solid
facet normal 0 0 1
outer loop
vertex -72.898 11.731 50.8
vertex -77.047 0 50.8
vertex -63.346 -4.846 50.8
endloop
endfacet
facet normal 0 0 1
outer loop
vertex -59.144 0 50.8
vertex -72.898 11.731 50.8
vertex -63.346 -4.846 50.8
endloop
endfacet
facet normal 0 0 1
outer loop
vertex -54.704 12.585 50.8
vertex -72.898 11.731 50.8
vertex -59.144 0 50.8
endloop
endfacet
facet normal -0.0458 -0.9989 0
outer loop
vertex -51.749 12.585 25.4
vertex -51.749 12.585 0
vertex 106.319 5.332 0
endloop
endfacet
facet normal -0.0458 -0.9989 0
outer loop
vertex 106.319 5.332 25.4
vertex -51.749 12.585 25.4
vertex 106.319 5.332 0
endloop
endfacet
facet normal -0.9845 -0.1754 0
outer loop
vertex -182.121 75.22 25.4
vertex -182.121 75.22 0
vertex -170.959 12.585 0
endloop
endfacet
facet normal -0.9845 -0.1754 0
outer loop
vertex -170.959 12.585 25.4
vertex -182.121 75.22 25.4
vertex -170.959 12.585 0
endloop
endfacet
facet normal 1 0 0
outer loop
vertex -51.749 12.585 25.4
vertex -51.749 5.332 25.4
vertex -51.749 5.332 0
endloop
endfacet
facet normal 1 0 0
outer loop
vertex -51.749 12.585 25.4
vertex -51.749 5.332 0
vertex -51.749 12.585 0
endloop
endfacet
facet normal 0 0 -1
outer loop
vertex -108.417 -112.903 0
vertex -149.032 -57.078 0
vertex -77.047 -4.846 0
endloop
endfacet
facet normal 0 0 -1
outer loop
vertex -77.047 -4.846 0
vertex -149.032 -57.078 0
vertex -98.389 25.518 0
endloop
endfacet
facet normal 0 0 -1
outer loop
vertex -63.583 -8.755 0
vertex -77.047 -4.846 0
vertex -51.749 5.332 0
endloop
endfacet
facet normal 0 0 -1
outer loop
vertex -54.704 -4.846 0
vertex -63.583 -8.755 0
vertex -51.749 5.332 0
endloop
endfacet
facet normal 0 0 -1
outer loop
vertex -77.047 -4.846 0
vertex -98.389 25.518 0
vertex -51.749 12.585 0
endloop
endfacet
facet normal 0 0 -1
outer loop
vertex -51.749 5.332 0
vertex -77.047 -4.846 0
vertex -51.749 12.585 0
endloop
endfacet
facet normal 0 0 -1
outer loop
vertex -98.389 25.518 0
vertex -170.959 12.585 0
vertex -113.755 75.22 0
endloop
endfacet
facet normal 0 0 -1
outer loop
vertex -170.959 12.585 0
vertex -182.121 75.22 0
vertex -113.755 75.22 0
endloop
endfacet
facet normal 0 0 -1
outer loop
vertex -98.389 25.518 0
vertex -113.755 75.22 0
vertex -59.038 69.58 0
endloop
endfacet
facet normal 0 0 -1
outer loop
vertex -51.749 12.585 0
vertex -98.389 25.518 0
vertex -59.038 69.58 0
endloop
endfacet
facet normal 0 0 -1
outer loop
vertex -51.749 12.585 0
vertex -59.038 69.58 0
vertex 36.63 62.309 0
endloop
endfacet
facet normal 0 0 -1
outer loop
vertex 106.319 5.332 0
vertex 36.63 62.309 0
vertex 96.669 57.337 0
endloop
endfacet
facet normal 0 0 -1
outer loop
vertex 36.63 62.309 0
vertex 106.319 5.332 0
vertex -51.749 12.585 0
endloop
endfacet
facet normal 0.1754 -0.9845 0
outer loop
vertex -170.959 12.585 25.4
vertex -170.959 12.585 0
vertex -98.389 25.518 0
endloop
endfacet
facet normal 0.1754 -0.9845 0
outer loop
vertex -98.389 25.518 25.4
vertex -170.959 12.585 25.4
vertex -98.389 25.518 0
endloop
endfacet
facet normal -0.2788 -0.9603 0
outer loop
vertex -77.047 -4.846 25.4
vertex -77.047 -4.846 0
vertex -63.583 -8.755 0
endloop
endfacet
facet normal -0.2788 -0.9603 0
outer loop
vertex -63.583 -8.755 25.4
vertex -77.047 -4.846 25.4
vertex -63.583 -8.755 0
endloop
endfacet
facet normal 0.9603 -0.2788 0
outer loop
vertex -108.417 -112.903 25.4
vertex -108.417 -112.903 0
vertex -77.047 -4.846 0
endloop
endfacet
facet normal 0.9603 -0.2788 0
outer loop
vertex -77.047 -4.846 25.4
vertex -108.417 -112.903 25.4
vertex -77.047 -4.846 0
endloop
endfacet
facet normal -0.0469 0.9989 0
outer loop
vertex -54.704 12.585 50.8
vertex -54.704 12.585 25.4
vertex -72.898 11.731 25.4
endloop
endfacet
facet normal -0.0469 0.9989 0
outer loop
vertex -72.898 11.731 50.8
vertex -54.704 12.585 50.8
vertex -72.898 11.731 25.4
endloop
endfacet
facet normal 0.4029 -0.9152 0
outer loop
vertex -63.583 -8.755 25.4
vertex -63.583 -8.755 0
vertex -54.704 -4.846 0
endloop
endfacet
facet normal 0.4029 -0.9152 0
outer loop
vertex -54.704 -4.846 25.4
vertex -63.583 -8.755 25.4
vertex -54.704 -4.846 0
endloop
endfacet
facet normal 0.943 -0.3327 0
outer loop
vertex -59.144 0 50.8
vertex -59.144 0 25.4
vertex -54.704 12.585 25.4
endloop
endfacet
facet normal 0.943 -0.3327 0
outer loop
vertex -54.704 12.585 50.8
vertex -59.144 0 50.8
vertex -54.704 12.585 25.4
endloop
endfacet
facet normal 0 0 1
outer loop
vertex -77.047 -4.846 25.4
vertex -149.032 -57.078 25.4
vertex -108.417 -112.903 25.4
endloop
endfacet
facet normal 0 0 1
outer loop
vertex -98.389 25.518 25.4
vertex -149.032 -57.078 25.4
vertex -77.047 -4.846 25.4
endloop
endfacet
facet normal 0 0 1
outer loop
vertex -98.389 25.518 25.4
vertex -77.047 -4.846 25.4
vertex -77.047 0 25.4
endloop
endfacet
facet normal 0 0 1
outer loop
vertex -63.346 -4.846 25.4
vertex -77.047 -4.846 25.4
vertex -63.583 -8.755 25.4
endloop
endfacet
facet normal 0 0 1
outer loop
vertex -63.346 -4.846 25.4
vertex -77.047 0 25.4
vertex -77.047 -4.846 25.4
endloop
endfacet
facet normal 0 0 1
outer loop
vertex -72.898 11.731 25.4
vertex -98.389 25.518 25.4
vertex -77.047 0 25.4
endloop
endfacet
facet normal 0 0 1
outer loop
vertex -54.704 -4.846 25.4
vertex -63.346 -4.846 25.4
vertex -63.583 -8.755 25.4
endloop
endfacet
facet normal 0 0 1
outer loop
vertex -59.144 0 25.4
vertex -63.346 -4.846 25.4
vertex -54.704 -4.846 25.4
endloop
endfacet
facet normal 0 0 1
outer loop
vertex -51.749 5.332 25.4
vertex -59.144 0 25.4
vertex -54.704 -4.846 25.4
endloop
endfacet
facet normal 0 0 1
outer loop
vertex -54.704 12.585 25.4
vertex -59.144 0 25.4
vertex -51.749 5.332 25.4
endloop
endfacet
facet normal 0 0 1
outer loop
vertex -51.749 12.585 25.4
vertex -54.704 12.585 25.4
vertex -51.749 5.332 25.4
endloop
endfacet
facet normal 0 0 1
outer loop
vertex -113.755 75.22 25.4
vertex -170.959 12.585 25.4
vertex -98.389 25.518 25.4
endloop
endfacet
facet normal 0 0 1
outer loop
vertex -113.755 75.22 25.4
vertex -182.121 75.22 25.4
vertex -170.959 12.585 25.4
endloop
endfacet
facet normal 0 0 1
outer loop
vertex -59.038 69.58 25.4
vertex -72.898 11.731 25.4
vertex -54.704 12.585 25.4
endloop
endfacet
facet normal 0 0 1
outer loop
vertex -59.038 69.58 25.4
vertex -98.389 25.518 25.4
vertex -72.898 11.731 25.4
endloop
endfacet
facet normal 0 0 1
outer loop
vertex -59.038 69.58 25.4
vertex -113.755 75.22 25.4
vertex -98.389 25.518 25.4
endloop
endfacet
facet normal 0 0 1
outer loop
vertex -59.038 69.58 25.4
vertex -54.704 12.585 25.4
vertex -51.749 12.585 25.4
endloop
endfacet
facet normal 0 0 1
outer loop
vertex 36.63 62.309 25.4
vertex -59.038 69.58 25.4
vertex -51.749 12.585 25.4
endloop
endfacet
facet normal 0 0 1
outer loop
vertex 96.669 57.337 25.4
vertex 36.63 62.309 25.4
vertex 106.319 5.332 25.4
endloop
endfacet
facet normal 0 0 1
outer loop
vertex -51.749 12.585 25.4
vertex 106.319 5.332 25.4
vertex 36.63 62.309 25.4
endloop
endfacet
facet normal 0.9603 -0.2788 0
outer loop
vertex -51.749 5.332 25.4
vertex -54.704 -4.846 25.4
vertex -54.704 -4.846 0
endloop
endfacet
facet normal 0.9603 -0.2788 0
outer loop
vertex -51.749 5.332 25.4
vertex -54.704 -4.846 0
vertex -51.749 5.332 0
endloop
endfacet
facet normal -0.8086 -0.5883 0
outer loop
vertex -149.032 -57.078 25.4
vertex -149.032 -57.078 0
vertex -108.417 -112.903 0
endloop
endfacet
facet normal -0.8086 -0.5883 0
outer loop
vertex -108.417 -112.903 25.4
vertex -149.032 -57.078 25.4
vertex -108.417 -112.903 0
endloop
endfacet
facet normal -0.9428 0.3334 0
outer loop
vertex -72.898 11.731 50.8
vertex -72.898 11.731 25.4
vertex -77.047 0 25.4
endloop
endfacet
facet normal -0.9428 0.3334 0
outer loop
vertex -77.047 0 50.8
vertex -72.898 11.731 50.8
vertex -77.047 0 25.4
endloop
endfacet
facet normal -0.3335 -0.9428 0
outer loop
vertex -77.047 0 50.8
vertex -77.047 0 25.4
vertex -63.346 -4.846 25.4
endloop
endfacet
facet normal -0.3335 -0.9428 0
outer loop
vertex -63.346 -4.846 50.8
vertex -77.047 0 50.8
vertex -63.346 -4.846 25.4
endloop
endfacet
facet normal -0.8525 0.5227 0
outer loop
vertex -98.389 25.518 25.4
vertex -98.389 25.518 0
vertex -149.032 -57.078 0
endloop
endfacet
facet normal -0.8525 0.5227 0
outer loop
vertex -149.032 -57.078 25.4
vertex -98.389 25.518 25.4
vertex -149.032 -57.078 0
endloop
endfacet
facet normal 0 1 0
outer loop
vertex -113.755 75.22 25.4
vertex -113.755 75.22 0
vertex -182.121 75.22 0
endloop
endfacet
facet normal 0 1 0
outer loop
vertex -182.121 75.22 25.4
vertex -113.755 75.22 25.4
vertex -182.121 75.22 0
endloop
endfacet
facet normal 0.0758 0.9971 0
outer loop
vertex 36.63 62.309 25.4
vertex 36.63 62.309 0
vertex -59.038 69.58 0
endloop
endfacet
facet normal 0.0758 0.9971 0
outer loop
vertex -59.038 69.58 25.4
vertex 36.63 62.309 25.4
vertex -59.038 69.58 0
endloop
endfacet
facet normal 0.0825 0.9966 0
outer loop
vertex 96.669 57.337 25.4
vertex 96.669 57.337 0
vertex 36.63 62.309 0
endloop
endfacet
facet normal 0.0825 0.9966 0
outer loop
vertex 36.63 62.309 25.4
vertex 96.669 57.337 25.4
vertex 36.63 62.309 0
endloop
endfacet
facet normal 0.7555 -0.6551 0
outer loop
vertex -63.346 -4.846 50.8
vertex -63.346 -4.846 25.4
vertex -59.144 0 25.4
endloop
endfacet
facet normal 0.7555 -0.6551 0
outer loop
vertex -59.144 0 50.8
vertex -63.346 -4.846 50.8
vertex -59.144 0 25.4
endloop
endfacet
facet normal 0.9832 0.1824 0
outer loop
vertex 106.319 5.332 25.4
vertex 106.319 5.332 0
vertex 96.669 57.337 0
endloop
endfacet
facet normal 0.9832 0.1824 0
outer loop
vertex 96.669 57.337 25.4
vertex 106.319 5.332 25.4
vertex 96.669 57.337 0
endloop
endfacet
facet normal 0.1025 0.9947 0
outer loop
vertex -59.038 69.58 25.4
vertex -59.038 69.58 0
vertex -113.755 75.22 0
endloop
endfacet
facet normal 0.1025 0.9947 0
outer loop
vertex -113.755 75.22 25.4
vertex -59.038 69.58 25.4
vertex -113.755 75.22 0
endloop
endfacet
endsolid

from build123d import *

# Parameters (mm, degrees)
F1_DEPTH = 25.4
F3_DEPTH = 25.4


with BuildPart() as f1:
    # F0 (on Top) → F1 (new body)
    with BuildSketch(Plane.XY):
        Polygon((-170.958579, 12.585102), (-98.389238, 25.517641), (-149.032265, -57.078436), (-108.417206, -112.903006), (-77.047296, -4.846431), (-74.092499, 5.331642), (-51.749377, 5.331642), (-51.749377, 12.585102), (106.318571, 5.331642), (96.669301, 57.336546), (36.629643, 62.309485), (-59.037734, 69.580153), (-113.755345, 75.21973), (-182.120658, 75.21973), align=None)
        Polygon((-74.092499, 5.331642), (-77.047296, -4.846431), (-63.583464, -8.755117), (-54.704174, -4.846431), (-51.749377, 5.331642), align=None)
    extrude(amount=F1_DEPTH)

    # F2 (on face) → F3 (join)
    with BuildSketch(Plane.XY.offset(25.4)):
        Polygon((-54.704174, 12.585102), (-72.897859, 11.73104), (-77.047296, 0), (-63.345755, -4.846431), (-59.143819, 0), align=None)
    extrude(amount=F3_DEPTH)


solid = f1.part
